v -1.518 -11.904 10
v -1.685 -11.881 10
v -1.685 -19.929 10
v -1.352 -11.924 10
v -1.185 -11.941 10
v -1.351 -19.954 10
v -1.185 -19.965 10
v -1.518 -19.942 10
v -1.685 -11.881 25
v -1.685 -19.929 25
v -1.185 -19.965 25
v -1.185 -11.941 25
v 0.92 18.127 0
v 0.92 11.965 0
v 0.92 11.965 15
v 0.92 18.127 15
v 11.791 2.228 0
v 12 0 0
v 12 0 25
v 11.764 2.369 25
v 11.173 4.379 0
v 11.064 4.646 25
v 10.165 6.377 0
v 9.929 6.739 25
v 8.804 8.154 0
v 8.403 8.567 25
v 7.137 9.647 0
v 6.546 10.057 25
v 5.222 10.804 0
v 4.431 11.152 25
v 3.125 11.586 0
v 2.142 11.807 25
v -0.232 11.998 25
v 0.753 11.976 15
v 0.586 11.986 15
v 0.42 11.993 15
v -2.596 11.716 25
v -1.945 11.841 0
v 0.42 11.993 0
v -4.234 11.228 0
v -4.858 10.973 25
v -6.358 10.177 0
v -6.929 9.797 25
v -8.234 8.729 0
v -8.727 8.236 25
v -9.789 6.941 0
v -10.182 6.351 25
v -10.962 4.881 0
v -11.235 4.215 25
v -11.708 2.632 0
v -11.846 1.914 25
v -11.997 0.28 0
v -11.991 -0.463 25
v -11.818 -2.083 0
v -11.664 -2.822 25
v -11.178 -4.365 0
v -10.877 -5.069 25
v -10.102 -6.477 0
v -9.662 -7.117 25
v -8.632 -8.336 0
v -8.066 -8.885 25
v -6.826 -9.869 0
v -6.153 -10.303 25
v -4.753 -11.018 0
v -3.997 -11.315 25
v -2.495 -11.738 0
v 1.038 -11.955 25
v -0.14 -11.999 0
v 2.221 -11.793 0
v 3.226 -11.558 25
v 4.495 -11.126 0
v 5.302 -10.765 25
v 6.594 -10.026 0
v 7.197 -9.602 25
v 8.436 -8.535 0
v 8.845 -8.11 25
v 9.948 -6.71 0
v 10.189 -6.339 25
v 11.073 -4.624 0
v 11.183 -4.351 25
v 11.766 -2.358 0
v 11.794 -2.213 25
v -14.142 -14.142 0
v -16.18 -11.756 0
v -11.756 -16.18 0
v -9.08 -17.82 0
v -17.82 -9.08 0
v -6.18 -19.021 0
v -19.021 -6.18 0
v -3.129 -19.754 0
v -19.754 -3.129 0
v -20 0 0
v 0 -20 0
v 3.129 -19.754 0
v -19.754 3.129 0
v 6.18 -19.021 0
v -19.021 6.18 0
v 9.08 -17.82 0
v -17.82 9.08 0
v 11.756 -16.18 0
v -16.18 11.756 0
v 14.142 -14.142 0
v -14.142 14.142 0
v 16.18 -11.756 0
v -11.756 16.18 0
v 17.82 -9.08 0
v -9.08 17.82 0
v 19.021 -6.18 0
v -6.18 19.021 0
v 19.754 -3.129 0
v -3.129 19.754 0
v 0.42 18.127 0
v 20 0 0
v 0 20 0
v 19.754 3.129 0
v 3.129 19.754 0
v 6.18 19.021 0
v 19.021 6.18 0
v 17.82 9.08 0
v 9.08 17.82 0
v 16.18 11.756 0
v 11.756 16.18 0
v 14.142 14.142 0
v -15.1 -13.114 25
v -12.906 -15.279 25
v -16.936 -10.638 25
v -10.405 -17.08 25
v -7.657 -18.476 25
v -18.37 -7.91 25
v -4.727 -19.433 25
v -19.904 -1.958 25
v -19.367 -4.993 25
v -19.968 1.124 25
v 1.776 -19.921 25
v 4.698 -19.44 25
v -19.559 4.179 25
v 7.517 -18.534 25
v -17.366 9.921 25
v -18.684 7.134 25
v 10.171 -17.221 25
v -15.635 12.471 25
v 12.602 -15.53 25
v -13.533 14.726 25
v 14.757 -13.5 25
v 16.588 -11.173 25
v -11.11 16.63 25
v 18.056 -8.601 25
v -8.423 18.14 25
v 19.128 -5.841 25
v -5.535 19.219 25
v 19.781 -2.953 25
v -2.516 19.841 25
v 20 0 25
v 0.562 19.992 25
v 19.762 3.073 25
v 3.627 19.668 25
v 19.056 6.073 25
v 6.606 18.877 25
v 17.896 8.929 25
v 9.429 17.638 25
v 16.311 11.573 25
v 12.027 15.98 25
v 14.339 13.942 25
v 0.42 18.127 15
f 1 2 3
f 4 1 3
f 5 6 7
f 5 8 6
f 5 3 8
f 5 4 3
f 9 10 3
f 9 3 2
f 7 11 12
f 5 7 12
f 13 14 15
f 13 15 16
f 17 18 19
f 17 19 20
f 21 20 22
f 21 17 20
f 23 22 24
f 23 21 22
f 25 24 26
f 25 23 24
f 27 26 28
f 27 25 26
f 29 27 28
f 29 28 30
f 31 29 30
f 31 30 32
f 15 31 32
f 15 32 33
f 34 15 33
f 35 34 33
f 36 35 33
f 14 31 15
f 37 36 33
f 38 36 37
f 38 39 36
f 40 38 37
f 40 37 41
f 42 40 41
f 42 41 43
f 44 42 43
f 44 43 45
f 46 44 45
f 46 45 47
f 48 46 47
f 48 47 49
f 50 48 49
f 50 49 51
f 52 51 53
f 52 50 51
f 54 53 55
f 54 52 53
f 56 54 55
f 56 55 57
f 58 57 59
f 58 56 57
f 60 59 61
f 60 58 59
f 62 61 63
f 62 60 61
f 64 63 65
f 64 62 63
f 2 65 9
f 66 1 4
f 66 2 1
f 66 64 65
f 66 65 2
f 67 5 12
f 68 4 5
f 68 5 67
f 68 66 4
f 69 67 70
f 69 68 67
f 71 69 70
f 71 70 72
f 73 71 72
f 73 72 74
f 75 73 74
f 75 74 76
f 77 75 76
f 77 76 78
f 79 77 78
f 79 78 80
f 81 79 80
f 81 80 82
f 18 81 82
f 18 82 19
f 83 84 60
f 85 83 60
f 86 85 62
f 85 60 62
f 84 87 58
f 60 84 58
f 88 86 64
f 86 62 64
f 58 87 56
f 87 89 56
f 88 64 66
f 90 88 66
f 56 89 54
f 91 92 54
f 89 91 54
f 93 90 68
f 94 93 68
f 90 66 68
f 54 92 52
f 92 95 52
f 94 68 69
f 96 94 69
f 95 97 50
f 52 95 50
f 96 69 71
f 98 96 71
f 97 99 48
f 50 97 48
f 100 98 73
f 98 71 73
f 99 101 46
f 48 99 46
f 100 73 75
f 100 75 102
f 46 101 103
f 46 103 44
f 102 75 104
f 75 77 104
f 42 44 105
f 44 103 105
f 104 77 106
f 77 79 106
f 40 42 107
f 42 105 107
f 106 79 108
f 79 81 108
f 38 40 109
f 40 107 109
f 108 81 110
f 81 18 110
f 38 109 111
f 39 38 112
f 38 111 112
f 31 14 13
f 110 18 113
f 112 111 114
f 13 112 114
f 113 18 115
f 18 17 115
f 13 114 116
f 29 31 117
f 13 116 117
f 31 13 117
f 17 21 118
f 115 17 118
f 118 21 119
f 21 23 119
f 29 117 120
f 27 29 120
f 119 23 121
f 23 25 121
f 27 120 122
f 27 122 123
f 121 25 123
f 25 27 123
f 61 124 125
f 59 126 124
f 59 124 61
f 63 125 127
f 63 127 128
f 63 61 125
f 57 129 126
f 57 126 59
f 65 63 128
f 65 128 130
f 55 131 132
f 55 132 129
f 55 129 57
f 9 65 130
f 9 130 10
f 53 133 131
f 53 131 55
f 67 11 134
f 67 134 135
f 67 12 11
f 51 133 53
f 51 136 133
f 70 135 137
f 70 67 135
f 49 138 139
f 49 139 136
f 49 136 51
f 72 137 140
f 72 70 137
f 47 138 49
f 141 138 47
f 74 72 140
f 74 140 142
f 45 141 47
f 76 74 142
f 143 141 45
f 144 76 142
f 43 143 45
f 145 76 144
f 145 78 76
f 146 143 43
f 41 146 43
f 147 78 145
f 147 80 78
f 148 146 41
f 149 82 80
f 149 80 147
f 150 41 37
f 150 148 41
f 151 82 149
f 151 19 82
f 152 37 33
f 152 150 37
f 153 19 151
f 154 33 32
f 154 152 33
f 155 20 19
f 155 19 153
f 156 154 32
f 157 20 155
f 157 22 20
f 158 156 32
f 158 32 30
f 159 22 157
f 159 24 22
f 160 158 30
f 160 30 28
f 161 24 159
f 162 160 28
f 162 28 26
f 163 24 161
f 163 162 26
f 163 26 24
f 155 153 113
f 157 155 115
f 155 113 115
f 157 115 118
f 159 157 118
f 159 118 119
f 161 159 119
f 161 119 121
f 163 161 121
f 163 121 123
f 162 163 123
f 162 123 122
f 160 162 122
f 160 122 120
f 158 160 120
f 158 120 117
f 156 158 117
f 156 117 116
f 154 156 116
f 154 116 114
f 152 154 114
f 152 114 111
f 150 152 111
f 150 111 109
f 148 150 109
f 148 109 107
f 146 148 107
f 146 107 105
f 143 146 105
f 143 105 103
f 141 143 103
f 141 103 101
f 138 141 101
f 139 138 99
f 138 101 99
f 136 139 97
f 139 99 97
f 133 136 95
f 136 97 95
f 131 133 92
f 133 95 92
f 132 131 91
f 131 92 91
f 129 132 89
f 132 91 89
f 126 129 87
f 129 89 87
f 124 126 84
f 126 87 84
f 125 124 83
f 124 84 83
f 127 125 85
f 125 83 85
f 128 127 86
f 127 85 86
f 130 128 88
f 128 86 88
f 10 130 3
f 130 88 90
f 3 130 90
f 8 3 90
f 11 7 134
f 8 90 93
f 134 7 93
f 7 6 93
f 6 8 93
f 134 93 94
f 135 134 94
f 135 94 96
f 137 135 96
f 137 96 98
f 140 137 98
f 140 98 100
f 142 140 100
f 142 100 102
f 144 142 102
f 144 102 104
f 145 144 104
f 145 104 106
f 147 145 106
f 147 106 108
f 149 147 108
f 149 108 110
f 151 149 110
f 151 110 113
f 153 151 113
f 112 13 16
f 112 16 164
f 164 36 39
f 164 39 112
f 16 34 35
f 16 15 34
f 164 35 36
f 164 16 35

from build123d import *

# Parameters (mm, degrees)
SKETCH_1_R          = 20
SKETCH_1_R_2        = 12
EXTRUDE_1_DEPTH     = 25
SKETCH_2_W          = 0.5
SKETCH_2_H          = 19.301562603
CUT_EXTRUDE_1_DEPTH = 15
SKETCH_3_W          = 0.5
SKETCH_3_H          = 20.813345434
CUT_EXTRUDE_2_DEPTH = 15


with BuildPart() as part:
    # 草图1 → 凸台-拉伸1 (new body)
    with BuildSketch(Plane.XY):
        Circle(SKETCH_1_R)
        Circle(SKETCH_1_R_2, mode=Mode.SUBTRACT)
    extrude(amount=EXTRUDE_1_DEPTH)

    # 草图2 → 切除-拉伸1 (cut)
    with BuildSketch(Plane.XY.offset(25)):
        with Locations((-1.434574757, -11.913941214)):
            Rectangle(SKETCH_2_W, SKETCH_2_H)
    extrude(amount=-CUT_EXTRUDE_1_DEPTH, mode=Mode.SUBTRACT)

    # 草图3 → 切除-拉伸2 (cut)
    with BuildSketch(Plane(origin=(0, 0, 0), x_dir=(-1, 0, 0), z_dir=(0, 0, -1))):
        with Locations((-0.669659449, 7.720299062)):
            Rectangle(SKETCH_3_W, SKETCH_3_H)
    extrude(amount=-CUT_EXTRUDE_2_DEPTH, mode=Mode.SUBTRACT)


solid = part.part
